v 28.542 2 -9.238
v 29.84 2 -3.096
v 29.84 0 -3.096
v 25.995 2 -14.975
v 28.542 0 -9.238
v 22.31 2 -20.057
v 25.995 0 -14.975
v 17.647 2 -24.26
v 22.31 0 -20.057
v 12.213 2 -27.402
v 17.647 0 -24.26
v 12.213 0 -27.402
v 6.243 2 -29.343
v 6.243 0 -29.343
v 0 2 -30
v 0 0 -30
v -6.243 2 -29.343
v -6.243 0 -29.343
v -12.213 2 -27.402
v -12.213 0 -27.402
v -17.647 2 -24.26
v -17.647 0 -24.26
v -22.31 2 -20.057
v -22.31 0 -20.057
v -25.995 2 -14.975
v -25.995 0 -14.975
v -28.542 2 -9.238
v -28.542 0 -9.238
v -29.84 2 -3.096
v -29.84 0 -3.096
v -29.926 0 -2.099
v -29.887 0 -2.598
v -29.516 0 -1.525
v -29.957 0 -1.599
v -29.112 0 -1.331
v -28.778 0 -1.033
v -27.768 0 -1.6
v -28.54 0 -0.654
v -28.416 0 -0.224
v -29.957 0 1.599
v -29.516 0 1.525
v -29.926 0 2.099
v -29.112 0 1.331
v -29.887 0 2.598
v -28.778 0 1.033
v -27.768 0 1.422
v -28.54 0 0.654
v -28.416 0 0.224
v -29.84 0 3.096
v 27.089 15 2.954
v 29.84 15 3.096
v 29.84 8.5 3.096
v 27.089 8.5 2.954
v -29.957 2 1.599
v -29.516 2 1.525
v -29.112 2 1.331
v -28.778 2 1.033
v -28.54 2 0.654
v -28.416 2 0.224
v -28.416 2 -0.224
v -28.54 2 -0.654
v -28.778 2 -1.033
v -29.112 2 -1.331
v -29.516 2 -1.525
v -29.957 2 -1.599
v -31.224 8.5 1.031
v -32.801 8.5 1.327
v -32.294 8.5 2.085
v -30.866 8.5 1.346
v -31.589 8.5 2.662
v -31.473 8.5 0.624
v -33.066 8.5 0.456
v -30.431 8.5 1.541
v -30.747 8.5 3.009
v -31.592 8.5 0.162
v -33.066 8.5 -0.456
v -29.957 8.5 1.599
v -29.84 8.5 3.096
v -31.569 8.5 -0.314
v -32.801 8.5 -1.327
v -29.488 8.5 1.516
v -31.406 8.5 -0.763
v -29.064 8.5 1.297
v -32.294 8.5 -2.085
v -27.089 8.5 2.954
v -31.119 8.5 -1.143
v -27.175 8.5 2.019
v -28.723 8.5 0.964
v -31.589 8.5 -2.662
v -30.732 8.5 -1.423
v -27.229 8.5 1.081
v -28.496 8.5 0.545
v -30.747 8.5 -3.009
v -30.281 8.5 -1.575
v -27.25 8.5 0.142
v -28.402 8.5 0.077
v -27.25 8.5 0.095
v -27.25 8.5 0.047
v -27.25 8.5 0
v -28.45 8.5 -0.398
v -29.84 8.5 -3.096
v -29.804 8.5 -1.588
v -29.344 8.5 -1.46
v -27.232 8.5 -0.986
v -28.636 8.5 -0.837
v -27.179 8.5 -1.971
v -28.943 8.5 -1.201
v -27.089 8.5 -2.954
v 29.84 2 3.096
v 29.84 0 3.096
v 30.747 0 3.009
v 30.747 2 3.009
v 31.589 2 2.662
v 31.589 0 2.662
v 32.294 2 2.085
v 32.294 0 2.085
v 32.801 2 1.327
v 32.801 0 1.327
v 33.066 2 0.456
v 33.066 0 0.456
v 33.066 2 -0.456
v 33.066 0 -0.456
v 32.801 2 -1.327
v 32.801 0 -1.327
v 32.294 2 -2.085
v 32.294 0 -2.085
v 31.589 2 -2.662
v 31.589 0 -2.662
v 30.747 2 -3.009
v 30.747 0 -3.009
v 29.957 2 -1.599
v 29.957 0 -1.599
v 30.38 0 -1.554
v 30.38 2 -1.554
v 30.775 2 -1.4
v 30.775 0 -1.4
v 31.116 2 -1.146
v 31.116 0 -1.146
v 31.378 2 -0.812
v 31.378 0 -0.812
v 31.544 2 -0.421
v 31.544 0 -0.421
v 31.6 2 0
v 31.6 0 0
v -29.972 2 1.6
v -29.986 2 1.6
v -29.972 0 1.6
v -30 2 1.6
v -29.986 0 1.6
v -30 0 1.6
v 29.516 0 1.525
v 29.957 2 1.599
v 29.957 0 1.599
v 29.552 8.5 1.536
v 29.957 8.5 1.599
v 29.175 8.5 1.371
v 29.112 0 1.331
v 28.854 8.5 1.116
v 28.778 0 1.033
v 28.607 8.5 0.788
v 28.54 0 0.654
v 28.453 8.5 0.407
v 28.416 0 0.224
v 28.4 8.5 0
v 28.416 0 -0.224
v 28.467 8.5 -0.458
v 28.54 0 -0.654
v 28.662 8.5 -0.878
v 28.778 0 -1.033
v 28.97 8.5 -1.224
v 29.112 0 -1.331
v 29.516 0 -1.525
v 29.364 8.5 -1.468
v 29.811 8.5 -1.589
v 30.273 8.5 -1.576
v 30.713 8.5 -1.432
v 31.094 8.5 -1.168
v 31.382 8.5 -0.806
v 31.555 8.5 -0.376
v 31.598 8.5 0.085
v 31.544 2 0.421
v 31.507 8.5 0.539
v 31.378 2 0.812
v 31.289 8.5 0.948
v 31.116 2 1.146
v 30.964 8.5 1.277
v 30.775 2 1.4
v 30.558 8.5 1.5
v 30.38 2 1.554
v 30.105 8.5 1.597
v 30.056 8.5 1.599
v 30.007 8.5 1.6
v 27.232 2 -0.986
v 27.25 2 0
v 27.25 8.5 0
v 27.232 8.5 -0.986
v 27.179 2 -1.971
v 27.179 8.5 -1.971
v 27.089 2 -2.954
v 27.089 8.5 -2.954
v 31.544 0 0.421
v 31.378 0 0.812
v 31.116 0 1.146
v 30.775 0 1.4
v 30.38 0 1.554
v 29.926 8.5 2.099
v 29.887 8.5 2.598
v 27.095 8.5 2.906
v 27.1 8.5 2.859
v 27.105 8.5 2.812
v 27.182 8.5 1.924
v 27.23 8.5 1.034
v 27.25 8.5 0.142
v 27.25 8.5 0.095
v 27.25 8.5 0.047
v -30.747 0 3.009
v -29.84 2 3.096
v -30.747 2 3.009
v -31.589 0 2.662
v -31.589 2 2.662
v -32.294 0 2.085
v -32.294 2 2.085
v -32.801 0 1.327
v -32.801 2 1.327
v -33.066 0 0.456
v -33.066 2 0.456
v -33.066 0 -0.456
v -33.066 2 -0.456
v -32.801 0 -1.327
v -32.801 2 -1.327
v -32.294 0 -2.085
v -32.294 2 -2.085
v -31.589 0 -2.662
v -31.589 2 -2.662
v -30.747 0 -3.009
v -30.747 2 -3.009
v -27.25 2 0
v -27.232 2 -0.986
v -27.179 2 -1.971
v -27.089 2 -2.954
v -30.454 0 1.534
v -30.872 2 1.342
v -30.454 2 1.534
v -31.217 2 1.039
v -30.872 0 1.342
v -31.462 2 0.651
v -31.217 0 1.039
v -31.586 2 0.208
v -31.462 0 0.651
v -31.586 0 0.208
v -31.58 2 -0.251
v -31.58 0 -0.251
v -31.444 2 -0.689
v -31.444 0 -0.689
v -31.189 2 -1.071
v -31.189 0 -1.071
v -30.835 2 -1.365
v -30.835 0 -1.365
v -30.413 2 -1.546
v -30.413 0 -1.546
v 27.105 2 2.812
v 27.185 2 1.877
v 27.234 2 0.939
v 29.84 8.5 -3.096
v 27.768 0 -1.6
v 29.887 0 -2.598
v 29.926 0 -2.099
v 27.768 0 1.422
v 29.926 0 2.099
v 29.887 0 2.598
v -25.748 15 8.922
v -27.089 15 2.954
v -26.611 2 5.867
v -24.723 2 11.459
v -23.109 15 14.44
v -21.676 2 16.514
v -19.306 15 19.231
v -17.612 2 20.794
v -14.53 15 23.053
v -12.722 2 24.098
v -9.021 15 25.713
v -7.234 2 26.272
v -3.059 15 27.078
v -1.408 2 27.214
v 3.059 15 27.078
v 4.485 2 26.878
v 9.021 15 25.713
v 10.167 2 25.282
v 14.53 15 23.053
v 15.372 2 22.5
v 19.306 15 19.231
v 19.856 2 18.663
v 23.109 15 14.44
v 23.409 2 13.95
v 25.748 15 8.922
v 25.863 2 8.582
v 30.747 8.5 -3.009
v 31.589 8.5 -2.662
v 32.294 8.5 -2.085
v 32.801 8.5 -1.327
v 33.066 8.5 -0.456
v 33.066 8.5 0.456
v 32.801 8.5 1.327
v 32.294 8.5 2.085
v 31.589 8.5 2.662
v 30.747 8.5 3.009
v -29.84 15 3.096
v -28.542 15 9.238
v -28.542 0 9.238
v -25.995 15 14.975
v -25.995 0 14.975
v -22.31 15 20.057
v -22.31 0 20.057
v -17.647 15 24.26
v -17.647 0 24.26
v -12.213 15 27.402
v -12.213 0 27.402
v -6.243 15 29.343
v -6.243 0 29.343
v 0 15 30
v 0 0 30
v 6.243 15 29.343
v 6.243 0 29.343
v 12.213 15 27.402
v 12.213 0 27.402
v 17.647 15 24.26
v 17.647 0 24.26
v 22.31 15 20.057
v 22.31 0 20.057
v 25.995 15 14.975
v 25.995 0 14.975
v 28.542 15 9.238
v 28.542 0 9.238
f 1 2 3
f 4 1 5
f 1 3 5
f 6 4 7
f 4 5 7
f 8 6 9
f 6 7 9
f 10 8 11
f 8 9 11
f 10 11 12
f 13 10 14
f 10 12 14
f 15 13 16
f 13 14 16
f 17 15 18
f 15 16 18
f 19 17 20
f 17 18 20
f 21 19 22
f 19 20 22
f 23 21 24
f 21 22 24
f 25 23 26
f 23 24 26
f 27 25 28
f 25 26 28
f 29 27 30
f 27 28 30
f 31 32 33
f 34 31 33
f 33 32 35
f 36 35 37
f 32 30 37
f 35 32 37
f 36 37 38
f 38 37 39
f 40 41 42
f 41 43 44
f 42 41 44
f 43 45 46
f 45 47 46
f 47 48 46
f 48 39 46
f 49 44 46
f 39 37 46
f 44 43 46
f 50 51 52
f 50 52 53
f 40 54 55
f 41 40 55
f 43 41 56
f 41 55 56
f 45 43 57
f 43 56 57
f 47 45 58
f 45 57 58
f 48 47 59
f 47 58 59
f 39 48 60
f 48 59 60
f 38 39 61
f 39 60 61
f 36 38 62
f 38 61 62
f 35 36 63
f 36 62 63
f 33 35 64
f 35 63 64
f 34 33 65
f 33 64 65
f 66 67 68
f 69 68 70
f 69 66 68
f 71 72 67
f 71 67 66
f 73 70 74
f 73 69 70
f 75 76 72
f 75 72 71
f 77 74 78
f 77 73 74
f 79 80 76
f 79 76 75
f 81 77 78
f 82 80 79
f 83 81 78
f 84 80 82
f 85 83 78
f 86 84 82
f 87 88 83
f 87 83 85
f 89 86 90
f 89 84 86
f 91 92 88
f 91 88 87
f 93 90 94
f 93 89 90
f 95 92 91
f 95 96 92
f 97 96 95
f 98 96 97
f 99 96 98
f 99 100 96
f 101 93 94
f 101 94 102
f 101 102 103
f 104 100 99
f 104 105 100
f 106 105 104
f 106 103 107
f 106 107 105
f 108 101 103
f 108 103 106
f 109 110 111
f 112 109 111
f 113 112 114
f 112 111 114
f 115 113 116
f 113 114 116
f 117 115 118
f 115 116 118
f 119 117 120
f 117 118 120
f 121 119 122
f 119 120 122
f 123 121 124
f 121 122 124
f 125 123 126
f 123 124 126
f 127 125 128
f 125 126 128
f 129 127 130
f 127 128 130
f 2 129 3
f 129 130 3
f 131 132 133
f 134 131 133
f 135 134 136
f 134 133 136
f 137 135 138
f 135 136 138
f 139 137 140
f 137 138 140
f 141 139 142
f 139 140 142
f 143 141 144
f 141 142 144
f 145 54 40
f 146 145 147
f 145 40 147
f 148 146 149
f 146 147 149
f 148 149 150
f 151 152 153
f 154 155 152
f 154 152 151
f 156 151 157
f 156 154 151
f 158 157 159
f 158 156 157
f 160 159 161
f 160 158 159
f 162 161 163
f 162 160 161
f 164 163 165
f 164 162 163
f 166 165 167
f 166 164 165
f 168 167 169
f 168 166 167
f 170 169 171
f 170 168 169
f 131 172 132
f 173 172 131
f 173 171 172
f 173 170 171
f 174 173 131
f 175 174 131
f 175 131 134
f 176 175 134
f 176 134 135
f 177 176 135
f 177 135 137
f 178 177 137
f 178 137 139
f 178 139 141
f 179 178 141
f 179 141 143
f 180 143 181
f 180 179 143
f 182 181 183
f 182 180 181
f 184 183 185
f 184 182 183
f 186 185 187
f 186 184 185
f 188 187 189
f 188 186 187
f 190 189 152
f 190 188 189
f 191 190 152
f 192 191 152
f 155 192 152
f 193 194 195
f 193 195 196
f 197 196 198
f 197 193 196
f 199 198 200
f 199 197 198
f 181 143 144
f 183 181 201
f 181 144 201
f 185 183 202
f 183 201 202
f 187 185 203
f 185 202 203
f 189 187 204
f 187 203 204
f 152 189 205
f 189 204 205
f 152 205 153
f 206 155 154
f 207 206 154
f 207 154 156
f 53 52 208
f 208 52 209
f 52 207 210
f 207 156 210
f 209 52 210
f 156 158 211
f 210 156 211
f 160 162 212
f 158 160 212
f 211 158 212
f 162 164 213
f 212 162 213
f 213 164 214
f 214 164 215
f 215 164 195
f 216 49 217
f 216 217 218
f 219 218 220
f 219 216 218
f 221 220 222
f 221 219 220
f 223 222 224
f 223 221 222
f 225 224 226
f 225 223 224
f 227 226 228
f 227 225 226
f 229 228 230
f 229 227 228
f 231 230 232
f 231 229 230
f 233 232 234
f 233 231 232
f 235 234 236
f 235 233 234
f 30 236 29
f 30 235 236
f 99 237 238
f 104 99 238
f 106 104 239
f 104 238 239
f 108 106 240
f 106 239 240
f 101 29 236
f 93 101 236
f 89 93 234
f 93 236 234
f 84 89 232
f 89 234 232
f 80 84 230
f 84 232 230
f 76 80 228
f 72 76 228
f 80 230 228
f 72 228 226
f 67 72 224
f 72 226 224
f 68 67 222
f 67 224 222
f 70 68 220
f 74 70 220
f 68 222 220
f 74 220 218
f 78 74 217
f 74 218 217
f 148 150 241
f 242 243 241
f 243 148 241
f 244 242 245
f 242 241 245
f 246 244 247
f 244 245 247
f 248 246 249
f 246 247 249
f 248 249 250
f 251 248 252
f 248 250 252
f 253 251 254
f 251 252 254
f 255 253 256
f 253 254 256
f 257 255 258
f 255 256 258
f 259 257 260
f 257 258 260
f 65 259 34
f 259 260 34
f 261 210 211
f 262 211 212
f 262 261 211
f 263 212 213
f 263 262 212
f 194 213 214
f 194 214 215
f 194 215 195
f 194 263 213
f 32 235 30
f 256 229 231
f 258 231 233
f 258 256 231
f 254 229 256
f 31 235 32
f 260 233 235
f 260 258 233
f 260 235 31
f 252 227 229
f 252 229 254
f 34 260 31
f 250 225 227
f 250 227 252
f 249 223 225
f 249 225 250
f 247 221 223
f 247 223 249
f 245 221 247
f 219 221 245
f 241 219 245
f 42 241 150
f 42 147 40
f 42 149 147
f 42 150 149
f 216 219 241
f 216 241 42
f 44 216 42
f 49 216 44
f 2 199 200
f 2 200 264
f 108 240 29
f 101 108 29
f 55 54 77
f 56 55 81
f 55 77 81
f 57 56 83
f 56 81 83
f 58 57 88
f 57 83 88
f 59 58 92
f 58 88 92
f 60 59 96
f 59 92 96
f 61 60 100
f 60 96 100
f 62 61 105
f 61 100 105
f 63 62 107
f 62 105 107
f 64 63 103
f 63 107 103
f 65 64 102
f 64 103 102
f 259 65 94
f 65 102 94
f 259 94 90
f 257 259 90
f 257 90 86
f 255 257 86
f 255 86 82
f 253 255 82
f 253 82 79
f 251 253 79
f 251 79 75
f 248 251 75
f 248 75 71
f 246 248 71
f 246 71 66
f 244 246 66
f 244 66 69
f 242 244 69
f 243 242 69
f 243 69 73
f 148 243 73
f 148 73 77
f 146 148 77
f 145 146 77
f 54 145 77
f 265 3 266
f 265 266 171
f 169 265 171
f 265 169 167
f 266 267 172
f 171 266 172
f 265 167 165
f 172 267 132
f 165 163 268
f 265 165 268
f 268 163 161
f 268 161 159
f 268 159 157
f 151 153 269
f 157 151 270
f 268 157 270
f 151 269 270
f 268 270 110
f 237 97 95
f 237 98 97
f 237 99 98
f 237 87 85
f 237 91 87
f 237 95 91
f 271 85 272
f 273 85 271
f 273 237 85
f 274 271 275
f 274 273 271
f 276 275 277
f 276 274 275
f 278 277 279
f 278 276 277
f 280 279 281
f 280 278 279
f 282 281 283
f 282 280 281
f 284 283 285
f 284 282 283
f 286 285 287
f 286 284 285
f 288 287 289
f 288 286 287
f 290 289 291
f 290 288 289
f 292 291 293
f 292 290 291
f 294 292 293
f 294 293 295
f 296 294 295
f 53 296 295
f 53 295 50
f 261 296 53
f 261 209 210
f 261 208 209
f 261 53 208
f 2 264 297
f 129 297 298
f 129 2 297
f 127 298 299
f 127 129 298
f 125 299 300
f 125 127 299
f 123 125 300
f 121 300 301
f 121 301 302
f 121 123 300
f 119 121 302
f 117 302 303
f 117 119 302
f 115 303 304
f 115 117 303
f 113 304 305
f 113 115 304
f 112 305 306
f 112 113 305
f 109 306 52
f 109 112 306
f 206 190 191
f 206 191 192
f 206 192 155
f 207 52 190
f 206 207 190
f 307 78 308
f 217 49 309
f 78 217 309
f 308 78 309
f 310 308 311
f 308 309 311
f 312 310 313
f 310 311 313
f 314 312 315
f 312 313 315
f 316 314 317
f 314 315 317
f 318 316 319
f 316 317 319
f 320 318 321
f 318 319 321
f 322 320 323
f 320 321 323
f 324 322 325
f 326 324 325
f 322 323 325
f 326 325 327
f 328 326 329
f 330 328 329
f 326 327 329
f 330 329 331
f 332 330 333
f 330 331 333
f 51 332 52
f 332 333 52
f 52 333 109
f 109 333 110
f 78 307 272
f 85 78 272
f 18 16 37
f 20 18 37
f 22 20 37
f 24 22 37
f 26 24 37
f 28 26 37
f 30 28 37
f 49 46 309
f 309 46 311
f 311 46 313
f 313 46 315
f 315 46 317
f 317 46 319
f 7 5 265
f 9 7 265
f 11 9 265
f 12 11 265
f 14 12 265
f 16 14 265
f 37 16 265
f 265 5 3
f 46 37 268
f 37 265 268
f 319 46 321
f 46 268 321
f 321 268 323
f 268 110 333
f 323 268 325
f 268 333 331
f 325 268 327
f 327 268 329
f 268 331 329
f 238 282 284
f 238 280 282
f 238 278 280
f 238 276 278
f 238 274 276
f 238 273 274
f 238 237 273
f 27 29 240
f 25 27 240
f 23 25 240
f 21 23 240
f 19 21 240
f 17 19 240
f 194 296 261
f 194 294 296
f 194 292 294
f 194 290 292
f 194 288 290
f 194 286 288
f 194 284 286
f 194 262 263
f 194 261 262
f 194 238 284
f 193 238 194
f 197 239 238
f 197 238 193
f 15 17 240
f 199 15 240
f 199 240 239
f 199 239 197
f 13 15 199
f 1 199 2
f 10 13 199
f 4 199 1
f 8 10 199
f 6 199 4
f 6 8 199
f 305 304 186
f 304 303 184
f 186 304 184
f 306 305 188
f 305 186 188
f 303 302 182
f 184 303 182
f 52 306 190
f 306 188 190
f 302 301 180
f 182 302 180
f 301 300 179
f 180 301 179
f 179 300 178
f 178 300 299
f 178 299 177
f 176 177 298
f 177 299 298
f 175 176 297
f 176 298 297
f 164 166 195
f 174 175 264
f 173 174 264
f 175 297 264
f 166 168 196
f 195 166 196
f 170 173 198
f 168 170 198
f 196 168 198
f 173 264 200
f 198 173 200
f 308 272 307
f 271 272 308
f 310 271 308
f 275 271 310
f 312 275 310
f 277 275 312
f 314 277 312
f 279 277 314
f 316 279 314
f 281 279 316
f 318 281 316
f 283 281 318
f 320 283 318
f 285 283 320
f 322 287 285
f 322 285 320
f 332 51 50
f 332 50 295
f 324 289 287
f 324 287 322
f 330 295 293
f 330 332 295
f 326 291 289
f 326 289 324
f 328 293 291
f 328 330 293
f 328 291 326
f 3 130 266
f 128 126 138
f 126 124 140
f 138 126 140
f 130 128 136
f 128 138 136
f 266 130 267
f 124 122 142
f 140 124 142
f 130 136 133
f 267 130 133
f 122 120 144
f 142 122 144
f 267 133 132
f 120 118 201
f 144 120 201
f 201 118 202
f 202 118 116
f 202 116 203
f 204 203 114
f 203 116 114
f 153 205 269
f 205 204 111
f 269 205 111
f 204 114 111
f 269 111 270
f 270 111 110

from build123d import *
from build123d.topology import SkipClean

# Parameters (mm, degrees)
SKETCH1_R           = 30
BOSS_EXTRUDE1_DEPTH = 2
SKETCH2_R           = 30
SKETCH2_R_2         = 27.25
BOSS_EXTRUDE2_DEPTH = 13
SKETCH6_W           = 70.354882949
SKETCH6_H           = 43.333649447
CUT_EXTRUDE4_DEPTH  = 13
BOSS_EXTRUDE3_DEPTH = 6.5
SKETCH8_R           = 1.6
CUT_EXTRUDE5_DEPTH  = 48.123348777
CUT_EXTRUDE6_DEPTH  = 6.5
SKETCH10_R          = 1.6
BOSS_EXTRUDE4_DEPTH = 2


with BuildPart() as part:
    # Sketch1 → Boss-Extrude1 (new body)
    with BuildSketch(Plane(origin=(0, 0, 0), x_dir=(1, 0, 0), z_dir=(0, 1, 0))):
        with Locations(Location((0, 0, 0), (0, 0, 270))):
            Circle(SKETCH1_R)
    extrude(amount=BOSS_EXTRUDE1_DEPTH)

    # Sketch2 → Boss-Extrude2 (add)
    with BuildSketch(Plane(origin=(0, 2, 0), x_dir=(1, 0, 0), z_dir=(0, 1, 0))):
        with Locations(Location((0, 0, 0), (0, 0, 270))):
            Circle(SKETCH2_R)
        with Locations(Location((0, 0, 0), (0, 0, 90))):
            Circle(SKETCH2_R_2, mode=Mode.SUBTRACT)
    extrude(amount=BOSS_EXTRUDE2_DEPTH)

    # Sketch6 → Cut-Extrude4 (cut)
    with BuildSketch(Plane(origin=(0, 15, 0), x_dir=(1, 0, 0), z_dir=(0, 1, 0))):
        with Locations((0.677303789, 21.666824724)):
            Rectangle(SKETCH6_W, SKETCH6_H)
    extrude(amount=-CUT_EXTRUDE4_DEPTH, mode=Mode.SUBTRACT)

    # Sketch7 → Boss-Extrude3 (add)
    with BuildSketch(Plane(origin=(0, 2, 0), x_dir=(1, 0, 0), z_dir=(0, 1, 0))):
        with BuildLine():
            Line((-29.839833333, -3.095859596), (-27.104515278, -2.812072466))
            ThreePointArc((-27.104515278, -2.812072466), (-27.249907122, 0.071146531), (-27.089461823, 2.95356702))
            Line((-27.089461823, 2.95356702), (-29.839833333, 3.095859596))
            ThreePointArc((-29.839833333, 3.095859596), (-33.1, 0), (-29.839833333, -3.095859596))
        make_face()
    boss_extrude3 = extrude(amount=BOSS_EXTRUDE3_DEPTH)

    # Sketch8 → Cut-Extrude5 (cut, through all)
    with BuildSketch(Plane(origin=(0, 15, 0), x_dir=(1, 0, 0), z_dir=(0, 1, 0))):
        with Locations(Location((-30, 0, 0), (0, 0, 271.528068595))):
            Circle(SKETCH8_R)
    cut_extrude5 = extrude(amount=-CUT_EXTRUDE5_DEPTH, mode=Mode.SUBTRACT)

    # Sketch9 → Cut-Extrude6 (cut)
    with BuildSketch(Plane(origin=(0, 15, 0), x_dir=(1, 0, 0), z_dir=(0, 1, 0))):
        Polygon((-29.839833333, -3.095859596), (27.24962849, -0.142292576), (-26.876929026, 0), (-30.387259787, 0), align=None)
    cut_extrude6 = extrude(amount=-CUT_EXTRUDE6_DEPTH, mode=Mode.SUBTRACT)

    # Sketch10 → Boss-Extrude4 (add)
    # profile 1 of 2: a face of its own
    with SkipClean():  # the faces are left unmerged after this step: merging them gives an invalid solid
        with BuildSketch(Plane.XZ):
            with BuildLine():
                Line((-29.839833333, -3.095859596), (-27.768095558, -1.6))
                Line((-27.768095558, -1.6), (-27.768095558, 1.42157282))
                Line((-27.768095558, 1.42157282), (-29.839833333, 3.095859596))
                ThreePointArc((-29.839833333, 3.095859596), (-33.1, 0), (-29.839833333, -3.095859596))
            make_face()
            with Locations(Location((-30, 0, 0), (0, 0, 90))):
                Circle(SKETCH10_R, mode=Mode.SUBTRACT)
        # profile 2 of 2: a face of its own
        with BuildSketch(Plane.XZ):
            with BuildLine():
                Line((27.768095558, 1.42157282), (29.839833333, 3.095859596))
                ThreePointArc((29.839833333, 3.095859596), (33.1, 0), (29.839833333, -3.095859596))
                Line((29.839833333, -3.095859596), (27.768095558, -1.6))
                Line((27.768095558, -1.6), (27.768095558, 1.42157282))
            make_face()
            with Locations((30, 0)):
                Circle(SKETCH10_R, mode=Mode.SUBTRACT)
        extrude(amount=-BOSS_EXTRUDE4_DEPTH)

    # Mirror2: Boss-Extrude3, Cut-Extrude5, Cut-Extrude6 across plane
    with SkipClean():  # the faces are left unmerged after this step: merging them gives an invalid solid
        add(boss_extrude3.mirror(Plane(origin=(0, 0, 0), x_dir=(0, 0, 1), z_dir=(1, 0, 0))))
        add(cut_extrude5.mirror(Plane(origin=(0, 0, 0), x_dir=(0, 0, 1), z_dir=(1, 0, 0))), mode=Mode.SUBTRACT)
        add(cut_extrude6.mirror(Plane(origin=(0, 0, 0), x_dir=(0, 0, 1), z_dir=(1, 0, 0))), mode=Mode.SUBTRACT)


solid = part.part
